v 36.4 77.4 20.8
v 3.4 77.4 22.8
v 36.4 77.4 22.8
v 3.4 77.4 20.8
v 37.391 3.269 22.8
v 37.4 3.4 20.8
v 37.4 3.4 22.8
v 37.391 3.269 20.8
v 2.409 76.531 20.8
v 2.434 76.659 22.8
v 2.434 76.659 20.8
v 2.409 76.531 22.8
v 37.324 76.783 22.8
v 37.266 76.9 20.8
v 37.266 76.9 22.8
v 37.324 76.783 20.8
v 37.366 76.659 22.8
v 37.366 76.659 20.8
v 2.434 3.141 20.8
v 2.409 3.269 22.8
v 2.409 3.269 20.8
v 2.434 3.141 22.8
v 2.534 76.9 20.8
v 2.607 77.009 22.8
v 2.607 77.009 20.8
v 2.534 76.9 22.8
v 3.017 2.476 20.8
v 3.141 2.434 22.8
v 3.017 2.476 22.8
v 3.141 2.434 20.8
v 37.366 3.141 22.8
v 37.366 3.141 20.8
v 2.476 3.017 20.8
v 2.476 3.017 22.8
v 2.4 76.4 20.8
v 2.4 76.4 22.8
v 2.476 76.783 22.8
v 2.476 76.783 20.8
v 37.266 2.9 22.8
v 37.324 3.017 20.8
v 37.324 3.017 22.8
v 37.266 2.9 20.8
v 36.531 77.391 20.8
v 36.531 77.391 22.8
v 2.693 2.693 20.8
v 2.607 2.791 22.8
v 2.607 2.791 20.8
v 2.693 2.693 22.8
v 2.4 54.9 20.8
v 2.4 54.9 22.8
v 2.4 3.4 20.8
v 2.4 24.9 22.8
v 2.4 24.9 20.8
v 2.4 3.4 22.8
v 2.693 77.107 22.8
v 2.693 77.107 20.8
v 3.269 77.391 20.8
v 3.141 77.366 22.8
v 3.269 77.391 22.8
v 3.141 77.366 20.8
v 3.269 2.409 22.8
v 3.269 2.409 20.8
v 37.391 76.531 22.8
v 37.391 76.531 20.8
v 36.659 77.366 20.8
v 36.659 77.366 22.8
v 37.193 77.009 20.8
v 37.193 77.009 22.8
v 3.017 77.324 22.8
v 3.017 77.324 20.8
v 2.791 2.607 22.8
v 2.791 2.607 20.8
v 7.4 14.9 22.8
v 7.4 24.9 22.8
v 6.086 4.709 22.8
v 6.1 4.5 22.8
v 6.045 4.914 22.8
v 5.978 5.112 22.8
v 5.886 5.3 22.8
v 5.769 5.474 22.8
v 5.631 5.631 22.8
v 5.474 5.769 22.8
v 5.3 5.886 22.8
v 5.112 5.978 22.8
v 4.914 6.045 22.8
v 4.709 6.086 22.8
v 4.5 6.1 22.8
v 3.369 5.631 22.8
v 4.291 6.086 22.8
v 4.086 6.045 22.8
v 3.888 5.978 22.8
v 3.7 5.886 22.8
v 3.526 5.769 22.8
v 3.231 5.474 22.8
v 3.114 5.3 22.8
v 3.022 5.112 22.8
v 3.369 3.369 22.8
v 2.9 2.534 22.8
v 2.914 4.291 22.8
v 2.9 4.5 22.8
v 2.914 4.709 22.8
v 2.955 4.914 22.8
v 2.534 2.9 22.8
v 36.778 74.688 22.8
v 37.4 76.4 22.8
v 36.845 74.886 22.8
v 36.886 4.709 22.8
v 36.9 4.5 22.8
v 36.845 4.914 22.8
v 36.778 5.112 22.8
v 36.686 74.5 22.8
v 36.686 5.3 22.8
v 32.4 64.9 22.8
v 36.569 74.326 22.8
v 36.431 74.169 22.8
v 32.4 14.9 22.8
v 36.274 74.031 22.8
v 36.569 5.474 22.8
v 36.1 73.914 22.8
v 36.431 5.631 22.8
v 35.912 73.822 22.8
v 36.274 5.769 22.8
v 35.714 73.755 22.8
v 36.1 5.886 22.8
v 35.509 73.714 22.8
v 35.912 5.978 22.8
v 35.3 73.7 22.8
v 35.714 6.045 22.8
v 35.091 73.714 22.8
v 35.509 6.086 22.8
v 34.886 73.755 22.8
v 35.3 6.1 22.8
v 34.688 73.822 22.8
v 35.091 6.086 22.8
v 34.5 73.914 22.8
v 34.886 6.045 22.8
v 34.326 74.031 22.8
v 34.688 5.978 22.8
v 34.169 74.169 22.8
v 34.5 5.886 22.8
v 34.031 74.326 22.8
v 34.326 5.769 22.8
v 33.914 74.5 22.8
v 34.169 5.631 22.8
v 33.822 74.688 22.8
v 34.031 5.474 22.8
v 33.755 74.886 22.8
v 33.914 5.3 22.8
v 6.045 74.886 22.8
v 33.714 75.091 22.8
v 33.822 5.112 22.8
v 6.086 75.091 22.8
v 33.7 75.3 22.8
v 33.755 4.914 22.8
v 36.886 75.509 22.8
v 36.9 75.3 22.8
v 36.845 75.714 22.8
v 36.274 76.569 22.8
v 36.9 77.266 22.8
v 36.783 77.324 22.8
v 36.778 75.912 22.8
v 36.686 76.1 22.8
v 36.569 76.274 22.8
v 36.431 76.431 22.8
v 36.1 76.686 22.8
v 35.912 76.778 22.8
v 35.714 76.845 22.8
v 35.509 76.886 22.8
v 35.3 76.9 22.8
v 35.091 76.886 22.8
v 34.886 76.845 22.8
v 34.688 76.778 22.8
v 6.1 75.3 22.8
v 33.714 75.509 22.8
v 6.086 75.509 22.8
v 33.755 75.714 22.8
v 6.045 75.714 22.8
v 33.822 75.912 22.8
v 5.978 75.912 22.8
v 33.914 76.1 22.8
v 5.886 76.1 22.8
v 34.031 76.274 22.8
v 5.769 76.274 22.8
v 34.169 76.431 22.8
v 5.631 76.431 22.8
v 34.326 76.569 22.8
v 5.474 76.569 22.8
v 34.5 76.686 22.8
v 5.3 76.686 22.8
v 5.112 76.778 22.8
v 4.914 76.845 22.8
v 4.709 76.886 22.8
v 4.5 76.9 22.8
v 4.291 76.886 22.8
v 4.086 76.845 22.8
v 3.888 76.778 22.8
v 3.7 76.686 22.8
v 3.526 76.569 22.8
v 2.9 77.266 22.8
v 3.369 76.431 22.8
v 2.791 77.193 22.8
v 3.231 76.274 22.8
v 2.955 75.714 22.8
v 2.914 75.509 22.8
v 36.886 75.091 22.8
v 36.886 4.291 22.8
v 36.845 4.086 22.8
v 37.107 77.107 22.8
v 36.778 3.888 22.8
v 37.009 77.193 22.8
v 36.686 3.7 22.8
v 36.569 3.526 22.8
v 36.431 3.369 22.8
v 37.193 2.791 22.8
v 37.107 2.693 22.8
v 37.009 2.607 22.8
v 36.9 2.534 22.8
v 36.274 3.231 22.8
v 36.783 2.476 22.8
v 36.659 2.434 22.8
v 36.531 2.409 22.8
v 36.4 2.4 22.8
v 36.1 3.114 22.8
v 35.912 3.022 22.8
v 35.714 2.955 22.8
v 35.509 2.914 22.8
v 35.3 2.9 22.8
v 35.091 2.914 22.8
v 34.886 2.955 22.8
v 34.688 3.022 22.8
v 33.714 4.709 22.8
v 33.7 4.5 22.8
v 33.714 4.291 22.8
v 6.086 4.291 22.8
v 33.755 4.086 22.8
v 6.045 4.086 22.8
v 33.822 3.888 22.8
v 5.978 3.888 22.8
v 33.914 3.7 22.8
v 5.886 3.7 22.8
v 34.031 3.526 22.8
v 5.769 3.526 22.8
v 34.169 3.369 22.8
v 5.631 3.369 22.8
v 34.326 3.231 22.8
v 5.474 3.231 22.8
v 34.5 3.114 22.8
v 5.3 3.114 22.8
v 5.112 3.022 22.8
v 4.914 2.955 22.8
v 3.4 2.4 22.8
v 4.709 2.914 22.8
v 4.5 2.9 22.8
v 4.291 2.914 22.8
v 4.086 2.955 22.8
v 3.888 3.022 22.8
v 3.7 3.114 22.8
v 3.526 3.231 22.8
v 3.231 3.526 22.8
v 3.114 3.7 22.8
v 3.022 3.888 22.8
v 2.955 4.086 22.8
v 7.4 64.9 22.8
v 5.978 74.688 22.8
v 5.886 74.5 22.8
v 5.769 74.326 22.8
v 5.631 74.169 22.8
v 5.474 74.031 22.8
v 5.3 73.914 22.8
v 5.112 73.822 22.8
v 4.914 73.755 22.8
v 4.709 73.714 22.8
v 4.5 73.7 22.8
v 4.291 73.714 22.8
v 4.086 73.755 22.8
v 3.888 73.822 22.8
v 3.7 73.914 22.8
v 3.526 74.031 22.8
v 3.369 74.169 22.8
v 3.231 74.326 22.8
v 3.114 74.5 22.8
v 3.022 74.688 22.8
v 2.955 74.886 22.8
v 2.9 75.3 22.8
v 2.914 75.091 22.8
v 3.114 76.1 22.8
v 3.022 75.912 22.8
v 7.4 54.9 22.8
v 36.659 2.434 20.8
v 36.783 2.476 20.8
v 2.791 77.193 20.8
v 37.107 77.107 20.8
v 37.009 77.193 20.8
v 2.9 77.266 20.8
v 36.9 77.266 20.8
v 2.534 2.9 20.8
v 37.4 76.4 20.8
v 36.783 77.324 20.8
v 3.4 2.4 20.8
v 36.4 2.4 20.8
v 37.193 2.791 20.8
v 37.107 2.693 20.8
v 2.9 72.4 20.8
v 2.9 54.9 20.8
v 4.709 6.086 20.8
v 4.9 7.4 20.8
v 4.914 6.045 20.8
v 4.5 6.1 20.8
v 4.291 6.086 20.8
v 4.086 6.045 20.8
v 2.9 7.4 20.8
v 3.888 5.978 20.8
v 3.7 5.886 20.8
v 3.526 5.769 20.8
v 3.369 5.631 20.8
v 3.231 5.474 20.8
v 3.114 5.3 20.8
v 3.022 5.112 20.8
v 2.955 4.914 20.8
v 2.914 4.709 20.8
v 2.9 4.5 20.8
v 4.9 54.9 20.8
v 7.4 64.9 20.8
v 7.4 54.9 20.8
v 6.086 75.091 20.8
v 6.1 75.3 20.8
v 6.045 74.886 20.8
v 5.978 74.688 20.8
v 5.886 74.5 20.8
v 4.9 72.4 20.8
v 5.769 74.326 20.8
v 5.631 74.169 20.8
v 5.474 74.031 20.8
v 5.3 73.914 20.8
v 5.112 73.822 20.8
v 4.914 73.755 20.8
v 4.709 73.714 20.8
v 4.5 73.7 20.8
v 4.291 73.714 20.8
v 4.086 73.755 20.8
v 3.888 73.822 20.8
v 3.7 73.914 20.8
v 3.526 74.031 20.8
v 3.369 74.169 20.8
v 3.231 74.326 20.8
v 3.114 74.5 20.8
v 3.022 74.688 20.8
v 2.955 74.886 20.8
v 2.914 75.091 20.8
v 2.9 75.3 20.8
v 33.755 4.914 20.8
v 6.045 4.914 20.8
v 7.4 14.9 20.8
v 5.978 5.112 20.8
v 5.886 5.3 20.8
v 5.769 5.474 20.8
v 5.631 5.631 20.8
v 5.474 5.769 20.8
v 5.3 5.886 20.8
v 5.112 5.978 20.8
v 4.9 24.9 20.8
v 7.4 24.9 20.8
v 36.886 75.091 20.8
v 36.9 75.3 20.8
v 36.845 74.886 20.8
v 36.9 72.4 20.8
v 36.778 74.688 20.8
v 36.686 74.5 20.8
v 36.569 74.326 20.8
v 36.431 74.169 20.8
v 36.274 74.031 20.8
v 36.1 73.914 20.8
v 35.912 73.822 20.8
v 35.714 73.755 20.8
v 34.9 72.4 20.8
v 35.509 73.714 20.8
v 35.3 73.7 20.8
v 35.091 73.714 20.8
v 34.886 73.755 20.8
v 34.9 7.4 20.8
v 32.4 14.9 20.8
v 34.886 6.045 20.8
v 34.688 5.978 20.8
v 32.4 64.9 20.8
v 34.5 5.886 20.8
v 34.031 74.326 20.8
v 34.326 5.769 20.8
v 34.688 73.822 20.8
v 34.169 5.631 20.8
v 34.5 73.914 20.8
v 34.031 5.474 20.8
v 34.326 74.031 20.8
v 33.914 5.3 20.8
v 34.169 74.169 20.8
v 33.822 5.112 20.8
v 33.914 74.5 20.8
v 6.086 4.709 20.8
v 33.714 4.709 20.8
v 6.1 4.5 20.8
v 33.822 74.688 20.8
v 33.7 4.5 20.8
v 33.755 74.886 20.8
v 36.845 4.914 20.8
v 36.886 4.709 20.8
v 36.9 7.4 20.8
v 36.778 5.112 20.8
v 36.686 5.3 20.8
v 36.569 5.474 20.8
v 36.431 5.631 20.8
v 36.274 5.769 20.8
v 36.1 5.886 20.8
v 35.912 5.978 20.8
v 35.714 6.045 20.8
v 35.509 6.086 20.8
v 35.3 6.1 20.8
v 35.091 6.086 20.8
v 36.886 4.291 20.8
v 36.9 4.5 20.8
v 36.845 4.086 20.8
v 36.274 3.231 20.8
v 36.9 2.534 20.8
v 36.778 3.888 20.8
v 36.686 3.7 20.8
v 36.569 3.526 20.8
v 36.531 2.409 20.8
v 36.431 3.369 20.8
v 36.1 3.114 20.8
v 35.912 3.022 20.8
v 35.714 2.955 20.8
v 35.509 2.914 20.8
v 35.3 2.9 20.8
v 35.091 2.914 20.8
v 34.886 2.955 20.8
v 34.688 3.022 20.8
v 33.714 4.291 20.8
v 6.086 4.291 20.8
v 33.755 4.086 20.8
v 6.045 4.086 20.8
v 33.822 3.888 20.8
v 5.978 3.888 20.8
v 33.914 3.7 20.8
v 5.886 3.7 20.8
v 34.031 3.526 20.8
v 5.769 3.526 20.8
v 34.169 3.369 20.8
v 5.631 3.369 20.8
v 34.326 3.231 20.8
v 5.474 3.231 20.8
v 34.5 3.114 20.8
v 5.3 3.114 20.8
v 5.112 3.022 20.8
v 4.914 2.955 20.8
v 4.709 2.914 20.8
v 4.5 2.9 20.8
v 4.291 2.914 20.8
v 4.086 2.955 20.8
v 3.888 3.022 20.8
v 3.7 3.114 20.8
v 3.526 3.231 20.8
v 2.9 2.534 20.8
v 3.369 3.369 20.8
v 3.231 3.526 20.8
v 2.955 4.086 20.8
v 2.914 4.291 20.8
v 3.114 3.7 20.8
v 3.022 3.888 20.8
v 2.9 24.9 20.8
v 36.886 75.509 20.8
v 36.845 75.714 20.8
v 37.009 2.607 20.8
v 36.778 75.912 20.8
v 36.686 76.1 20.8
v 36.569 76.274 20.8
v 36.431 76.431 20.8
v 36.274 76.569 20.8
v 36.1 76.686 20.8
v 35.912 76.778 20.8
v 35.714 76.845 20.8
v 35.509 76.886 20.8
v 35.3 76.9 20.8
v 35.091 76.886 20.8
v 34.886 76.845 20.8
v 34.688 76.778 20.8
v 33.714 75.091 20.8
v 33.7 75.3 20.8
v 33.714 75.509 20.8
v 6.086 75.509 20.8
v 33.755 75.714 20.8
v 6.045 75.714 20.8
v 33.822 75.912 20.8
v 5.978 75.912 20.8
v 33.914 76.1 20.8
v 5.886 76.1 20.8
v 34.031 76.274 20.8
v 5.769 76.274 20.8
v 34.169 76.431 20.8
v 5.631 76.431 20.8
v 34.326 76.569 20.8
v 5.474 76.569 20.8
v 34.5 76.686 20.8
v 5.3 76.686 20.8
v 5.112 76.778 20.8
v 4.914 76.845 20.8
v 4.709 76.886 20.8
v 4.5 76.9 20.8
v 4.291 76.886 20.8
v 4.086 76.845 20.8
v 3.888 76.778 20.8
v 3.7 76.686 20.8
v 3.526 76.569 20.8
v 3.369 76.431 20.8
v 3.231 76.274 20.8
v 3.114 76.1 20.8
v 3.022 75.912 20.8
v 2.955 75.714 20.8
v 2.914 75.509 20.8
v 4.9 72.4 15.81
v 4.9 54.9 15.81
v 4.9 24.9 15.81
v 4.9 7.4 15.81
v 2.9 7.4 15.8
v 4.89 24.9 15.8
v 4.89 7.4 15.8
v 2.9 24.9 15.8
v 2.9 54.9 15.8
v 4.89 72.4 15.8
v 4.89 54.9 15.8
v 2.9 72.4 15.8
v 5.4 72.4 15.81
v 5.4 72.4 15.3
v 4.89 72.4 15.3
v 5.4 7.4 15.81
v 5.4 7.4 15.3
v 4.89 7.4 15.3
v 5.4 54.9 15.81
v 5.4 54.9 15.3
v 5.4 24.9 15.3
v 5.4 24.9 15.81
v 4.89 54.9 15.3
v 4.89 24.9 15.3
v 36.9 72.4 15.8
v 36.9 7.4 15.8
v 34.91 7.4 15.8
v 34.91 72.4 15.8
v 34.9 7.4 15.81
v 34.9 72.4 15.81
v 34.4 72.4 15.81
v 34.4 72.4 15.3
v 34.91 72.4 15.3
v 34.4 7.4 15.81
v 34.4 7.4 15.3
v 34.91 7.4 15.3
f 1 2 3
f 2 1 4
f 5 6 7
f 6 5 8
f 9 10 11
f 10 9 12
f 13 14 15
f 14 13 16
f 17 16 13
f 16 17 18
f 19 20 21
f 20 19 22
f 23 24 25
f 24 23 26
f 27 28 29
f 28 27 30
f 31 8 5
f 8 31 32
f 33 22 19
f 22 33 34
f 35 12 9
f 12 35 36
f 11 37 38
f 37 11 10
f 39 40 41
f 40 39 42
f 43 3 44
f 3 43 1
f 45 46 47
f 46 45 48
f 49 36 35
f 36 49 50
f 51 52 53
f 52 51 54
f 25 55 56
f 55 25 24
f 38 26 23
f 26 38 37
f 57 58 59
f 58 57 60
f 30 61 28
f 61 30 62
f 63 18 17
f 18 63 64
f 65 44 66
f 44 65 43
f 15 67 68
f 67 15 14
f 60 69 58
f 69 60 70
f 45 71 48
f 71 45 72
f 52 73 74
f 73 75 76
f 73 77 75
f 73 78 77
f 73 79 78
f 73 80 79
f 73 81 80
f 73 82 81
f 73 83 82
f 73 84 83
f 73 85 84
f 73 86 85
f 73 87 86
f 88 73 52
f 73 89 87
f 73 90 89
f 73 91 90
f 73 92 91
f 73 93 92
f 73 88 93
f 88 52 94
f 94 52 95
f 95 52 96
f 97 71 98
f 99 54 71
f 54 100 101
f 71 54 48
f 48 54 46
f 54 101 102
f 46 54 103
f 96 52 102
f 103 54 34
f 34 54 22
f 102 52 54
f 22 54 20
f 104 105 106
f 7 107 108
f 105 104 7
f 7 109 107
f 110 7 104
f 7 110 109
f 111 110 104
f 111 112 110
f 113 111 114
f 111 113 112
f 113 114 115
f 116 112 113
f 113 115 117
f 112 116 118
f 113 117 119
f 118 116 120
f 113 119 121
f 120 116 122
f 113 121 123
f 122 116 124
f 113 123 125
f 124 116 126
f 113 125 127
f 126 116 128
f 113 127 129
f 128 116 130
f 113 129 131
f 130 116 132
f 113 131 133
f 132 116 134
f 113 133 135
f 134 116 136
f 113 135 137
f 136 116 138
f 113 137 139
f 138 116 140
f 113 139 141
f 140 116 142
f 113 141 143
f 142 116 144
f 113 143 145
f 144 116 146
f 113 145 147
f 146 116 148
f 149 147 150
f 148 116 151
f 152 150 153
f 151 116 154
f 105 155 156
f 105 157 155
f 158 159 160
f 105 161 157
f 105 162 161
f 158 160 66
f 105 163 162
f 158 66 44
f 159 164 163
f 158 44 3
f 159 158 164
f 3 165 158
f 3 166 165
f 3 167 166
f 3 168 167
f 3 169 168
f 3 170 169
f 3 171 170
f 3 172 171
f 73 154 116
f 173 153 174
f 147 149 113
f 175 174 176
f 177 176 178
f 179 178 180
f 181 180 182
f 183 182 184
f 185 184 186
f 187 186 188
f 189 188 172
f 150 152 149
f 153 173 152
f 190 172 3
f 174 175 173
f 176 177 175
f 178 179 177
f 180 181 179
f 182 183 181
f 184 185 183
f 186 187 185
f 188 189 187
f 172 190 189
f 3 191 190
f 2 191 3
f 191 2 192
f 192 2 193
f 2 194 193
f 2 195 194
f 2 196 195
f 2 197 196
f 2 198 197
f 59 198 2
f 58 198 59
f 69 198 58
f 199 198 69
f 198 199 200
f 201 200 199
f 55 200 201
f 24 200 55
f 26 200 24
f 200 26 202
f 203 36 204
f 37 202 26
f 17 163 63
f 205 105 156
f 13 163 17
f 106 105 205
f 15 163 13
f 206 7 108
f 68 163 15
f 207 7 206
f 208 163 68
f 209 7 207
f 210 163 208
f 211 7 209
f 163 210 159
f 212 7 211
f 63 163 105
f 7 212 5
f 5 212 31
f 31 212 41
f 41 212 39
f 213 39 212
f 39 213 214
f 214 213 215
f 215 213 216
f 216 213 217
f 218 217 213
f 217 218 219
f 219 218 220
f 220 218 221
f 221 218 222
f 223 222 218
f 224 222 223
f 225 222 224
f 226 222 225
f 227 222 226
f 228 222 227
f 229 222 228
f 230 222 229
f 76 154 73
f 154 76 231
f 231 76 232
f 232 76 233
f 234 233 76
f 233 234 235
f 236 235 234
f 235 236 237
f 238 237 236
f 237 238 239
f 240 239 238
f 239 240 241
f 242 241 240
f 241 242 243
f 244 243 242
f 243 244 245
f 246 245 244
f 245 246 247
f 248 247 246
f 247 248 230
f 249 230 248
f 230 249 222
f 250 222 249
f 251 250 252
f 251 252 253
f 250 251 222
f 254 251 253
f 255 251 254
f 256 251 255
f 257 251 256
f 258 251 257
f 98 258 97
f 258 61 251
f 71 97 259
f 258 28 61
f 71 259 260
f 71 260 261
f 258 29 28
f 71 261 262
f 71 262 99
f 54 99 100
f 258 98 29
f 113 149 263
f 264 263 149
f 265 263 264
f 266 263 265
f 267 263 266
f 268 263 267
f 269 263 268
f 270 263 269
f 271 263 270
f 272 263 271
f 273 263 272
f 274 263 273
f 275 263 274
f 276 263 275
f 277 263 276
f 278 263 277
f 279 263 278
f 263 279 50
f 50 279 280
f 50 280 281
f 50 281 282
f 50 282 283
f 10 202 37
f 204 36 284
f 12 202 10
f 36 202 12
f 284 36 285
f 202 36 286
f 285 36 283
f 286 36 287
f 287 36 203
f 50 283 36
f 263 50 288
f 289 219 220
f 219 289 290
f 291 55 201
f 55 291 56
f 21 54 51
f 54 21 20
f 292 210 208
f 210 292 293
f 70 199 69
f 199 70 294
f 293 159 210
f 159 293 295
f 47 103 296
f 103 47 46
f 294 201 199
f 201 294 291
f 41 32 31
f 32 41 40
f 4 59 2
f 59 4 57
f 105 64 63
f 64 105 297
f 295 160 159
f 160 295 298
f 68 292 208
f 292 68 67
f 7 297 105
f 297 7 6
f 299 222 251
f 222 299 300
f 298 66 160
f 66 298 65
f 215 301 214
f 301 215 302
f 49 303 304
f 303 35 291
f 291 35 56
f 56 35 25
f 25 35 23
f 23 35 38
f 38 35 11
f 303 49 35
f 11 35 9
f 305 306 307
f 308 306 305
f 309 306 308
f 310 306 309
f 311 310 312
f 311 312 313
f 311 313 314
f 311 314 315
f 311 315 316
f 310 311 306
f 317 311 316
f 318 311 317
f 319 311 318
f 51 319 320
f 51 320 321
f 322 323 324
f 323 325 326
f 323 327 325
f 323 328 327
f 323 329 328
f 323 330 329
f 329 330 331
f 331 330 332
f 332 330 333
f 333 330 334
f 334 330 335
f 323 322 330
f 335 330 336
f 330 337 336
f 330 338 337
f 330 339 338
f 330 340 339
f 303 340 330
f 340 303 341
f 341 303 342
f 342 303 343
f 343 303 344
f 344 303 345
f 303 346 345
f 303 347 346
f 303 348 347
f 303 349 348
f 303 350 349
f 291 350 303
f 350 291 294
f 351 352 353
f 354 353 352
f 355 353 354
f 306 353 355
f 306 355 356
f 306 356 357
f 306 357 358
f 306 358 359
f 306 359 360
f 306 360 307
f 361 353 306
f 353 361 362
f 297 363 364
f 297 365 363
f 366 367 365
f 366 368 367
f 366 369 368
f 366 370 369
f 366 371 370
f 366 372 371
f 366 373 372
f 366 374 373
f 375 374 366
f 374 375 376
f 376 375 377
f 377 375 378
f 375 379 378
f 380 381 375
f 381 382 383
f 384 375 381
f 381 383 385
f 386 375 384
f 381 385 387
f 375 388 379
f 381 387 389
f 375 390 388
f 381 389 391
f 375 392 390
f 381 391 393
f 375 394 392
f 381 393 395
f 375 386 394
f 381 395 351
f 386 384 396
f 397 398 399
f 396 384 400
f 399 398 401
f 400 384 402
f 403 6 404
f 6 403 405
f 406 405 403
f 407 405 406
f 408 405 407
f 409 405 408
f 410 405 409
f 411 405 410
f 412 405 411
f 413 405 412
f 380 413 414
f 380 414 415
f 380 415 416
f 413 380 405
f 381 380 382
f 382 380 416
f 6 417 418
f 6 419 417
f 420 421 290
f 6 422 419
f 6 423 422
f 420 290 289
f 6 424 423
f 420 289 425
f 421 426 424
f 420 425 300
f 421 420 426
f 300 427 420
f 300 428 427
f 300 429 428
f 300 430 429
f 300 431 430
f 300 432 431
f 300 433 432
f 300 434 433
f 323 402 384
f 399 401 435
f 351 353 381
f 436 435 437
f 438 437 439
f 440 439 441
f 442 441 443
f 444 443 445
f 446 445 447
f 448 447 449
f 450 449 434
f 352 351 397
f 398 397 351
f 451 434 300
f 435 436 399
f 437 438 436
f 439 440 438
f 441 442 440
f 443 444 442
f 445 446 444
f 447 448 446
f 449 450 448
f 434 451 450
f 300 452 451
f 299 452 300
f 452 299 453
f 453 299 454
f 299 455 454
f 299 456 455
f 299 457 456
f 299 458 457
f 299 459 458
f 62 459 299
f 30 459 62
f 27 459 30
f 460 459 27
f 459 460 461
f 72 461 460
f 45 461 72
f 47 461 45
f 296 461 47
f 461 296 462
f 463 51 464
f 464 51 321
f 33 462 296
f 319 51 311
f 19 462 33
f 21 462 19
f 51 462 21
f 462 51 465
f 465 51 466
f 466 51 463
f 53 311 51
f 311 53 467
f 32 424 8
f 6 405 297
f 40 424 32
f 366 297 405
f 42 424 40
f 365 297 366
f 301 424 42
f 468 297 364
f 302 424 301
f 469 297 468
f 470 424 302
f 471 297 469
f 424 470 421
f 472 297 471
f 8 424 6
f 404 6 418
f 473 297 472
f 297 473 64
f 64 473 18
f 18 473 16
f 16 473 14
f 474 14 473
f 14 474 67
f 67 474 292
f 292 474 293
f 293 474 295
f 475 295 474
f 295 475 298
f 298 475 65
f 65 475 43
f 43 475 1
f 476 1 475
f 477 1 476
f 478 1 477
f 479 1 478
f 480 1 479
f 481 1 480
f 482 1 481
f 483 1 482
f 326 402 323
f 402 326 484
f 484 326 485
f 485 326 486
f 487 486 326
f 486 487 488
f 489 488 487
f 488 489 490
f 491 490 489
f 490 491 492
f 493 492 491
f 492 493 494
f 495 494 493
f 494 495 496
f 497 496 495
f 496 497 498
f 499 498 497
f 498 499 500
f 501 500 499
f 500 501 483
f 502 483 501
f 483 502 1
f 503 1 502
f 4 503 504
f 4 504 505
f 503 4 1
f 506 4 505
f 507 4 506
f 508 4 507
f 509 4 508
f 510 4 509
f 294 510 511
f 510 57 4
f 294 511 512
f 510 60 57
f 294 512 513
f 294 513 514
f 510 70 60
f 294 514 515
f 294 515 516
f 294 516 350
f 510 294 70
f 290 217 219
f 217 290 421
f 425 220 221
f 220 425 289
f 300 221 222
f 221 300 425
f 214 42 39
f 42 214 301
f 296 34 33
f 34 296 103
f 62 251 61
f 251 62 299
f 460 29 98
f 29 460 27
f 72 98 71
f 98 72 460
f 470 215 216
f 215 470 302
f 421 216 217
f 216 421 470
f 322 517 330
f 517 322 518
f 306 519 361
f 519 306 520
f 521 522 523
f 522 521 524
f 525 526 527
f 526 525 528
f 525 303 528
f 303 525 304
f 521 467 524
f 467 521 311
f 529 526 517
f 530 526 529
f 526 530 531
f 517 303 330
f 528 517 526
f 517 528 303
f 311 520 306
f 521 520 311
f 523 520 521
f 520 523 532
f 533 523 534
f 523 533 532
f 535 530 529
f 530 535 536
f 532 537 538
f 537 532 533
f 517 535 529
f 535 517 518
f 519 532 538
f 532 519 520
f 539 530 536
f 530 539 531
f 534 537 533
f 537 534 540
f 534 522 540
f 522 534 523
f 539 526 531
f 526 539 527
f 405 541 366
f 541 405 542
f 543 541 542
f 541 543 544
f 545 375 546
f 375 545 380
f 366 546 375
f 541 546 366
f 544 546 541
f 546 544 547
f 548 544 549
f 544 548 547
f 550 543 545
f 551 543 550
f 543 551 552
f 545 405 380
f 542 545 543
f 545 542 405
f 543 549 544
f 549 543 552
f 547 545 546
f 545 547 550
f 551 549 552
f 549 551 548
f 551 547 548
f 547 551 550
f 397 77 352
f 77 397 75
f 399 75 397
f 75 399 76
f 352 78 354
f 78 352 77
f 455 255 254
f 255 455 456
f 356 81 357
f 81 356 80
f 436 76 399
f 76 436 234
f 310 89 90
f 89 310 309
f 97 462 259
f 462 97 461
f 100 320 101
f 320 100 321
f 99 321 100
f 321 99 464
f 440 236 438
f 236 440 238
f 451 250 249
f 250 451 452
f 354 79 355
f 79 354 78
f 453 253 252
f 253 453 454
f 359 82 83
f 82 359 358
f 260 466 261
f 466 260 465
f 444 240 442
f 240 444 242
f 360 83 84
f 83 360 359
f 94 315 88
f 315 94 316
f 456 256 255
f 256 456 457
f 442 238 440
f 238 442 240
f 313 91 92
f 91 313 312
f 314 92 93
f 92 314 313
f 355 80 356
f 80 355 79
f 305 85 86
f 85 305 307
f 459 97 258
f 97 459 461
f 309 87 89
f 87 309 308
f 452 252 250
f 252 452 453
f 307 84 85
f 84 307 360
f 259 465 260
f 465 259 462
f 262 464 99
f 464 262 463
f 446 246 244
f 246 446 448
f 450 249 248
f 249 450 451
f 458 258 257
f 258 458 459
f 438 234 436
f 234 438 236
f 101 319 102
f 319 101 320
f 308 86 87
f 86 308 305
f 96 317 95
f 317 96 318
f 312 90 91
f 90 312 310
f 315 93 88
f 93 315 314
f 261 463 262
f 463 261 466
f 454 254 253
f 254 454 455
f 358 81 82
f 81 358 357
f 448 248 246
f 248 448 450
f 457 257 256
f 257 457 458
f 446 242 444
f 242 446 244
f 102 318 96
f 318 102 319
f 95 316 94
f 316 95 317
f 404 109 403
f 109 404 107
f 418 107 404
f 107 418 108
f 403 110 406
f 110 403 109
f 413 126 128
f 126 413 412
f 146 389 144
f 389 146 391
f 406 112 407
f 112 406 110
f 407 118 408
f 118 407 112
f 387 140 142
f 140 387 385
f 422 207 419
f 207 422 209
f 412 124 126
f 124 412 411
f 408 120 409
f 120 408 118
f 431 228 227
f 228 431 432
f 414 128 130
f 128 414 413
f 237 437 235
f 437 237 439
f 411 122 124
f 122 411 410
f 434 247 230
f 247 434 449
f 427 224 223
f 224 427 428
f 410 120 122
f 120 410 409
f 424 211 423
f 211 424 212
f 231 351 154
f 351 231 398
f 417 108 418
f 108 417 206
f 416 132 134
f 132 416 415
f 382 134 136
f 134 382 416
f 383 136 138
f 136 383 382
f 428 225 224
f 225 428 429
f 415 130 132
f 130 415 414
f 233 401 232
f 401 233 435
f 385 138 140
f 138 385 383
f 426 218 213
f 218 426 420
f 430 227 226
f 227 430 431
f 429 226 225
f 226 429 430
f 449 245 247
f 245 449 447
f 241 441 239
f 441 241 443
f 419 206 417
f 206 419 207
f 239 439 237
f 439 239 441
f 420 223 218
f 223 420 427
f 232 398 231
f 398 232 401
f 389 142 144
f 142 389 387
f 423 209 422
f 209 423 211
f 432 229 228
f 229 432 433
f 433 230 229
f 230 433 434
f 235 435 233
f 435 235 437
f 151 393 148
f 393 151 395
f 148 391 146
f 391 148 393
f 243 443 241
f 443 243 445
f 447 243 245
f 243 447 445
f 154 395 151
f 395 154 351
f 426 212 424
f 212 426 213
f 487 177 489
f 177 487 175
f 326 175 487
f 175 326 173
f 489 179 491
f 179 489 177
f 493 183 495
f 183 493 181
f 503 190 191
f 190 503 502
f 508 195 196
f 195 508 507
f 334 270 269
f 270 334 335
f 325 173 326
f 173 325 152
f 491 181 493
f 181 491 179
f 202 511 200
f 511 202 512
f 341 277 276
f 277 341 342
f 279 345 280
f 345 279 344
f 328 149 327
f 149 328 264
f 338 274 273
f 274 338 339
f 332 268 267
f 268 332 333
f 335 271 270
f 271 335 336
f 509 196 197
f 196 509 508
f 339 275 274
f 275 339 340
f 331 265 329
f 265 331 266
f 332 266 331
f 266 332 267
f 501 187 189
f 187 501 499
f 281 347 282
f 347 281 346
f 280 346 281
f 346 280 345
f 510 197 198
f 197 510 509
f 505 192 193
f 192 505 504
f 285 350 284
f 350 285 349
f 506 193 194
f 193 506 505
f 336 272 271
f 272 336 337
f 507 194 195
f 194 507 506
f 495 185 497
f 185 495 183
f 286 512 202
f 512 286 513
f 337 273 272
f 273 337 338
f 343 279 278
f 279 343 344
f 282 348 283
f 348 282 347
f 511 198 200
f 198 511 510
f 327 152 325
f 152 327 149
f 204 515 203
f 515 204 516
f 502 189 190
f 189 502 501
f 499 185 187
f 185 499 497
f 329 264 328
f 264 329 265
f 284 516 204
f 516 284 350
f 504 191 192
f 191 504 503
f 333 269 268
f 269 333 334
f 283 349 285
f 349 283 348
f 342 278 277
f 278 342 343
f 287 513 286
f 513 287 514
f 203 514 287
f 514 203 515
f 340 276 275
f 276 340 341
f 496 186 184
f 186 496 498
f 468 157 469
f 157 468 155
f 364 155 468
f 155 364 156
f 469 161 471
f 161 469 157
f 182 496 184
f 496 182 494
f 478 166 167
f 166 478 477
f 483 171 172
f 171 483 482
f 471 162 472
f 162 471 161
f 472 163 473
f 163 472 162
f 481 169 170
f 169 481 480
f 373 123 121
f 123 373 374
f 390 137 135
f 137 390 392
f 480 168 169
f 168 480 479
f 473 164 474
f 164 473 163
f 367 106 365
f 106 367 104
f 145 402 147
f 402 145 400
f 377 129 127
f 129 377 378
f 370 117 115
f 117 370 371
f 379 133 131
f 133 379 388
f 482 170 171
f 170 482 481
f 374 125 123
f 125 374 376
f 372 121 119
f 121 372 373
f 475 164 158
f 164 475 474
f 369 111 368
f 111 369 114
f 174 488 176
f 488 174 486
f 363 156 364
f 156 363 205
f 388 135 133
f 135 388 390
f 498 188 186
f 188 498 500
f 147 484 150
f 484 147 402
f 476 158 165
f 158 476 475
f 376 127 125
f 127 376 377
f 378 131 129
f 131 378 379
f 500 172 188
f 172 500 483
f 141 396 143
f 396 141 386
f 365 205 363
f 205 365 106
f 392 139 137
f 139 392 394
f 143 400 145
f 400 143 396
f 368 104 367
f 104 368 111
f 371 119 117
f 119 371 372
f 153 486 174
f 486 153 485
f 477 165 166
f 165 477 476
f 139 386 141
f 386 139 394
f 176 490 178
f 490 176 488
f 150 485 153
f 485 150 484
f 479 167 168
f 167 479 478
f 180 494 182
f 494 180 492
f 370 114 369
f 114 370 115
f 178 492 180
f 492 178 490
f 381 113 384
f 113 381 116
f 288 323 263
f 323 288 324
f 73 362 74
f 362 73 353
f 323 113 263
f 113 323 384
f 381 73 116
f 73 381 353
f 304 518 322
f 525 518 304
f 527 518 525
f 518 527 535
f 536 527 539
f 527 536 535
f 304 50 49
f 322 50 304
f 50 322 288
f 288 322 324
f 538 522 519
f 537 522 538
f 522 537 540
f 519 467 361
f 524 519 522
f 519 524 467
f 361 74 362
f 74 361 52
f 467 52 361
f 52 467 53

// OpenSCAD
// Dilder Top-Mid Plate (windowed) — display cover plate with viewing window + snap-fit rails
//
// Drops into the base shell, rests on the upper shelf at z=20.8.
// Two long rails on the underside grip the display edges with a snap-fit lip.
// Has a 25×50mm viewing window centered over the display.
//
// Export:
//   openscad -o top-plate-windowed.3mf top-plate-windowed.scad

$fn = 48;

// ---- Board (Olimex ESP32-S3-DevKit-Lipo) ----
board_len      = 56;
board_wid      = 28;
antenna_proj   = 6;

// ---- Waveshare 2.13" display ----
disp_len       = 65;
disp_wid       = 30;
disp_thk       = 5;
disp_window_w  = 25;
disp_window_l  = 50;

// ---- 1000 mAh battery ----
bat_len        = 52;
bat_wid        = 35;

// ---- Enclosure geometry ----
wall_thk       = 2;
plate_thk      = 2;
pillar         = 5;
slop           = 0.4;
bat_chamber_h  = 6;
disp_clear     = 1;
board_thk      = 1.6;
wroom_h        = 3.2;

screw_clr      = 3.2;

// ---- Rounding ----
plate_corner_r = 1;

// ---- Display viewing window ----
topmid_window_w = 25;
topmid_window_l = 50;

// ---- Snap rails ----
snap_rail_w    = 2;
snap_lip_d     = 0.5;
snap_lip_h     = 0.5;

// ---- Wire pass-through ----
wire_hole_len  = 30;
wire_hole_depth = 6;

// ---- Z layout ----
z_base_top     = plate_thk;
z_mid_bot      = z_base_top + bat_chamber_h;
z_mid_top      = z_mid_bot + plate_thk;
z_board_bot    = z_mid_top;
z_board_top    = z_board_bot + board_thk;
z_wroom_top    = z_board_top + wroom_h;
z_disp_bot     = z_wroom_top + disp_clear;
z_disp_top     = z_disp_bot + disp_thk;

// ---- XY layout ----
inner_wid      = max(board_wid, disp_wid, bat_wid) + 2 * slop;
inner_len      = max(board_len + antenna_proj, disp_len + 2 * pillar, bat_len) + 2 * slop;
outer_wid      = inner_wid + 2 * wall_thk;
outer_len      = inner_len + 2 * wall_thk;

pillar_xy = [
    [wall_thk,                             wall_thk                            ],
    [outer_wid - wall_thk - pillar,        wall_thk                            ],
    [wall_thk,                             outer_len - wall_thk - pillar       ],
    [outer_wid - wall_thk - pillar,        outer_len - wall_thk - pillar       ],
];

disp_x         = (outer_wid - disp_wid) / 2;
disp_y         = (outer_len - disp_len) / 2;


// ============== SHARED ==============

module rounded_v_box(w, l, h, r, fn = 48) {
    hull() {
        for (x = [r, w - r])
            for (y = [r, l - r])
                translate([x, y, 0])
                    cylinder(r = r, h = h, $fn = fn);
    }
}


// ============== TOP-MID PLATE (WINDOWED) ==============

module top_plate_windowed() {
    plate_w = inner_wid - 2 * slop;
    plate_l = inner_len - 2 * slop;
    plate_x = wall_thk + slop;
    plate_y = wall_thk + slop;

    rail_y_local      = disp_y - plate_y;
    rail_len          = disp_len;
    rail_x_left       = disp_x - plate_x - snap_rail_w;
    rail_x_right      = disp_x - plate_x + disp_wid;
    lip_x_left        = disp_x - plate_x;
    lip_x_right       = disp_x - plate_x + disp_wid - snap_lip_d;
    snap_rail_h       = disp_thk;

    // Display viewing window (centered on plate)
    win_x = (plate_w - topmid_window_w) / 2;
    win_y = (plate_l - topmid_window_l) / 2;

    // Wire pass-through hole (-X long side, centered on Y)
    wire_y = (plate_l - wire_hole_len) / 2;

    translate([plate_x, plate_y, z_disp_top])
    difference() {
        union() {
            rounded_v_box(plate_w, plate_l, plate_thk, plate_corner_r);

            // -X long rail (body + bottom lip)
            translate([rail_x_left, rail_y_local, -snap_rail_h])
                cube([snap_rail_w, rail_len, snap_rail_h]);
            translate([lip_x_left - 0.01, rail_y_local, -snap_rail_h - snap_lip_h])
                cube([snap_lip_d + 0.01, rail_len, snap_lip_h + 0.01]);

            // +X long rail
            translate([rail_x_right, rail_y_local, -snap_rail_h])
                cube([snap_rail_w, rail_len, snap_rail_h]);
            translate([lip_x_right, rail_y_local, -snap_rail_h - snap_lip_h])
                cube([snap_lip_d + 0.01, rail_len, snap_lip_h + 0.01]);
        }

        // Screw clearance holes
        for (p = pillar_xy)
            translate([p[0] + pillar/2 - plate_x, p[1] + pillar/2 - plate_y,
                       -snap_rail_h - snap_lip_h - 1])
                cylinder(h = plate_thk + snap_rail_h + snap_lip_h + 2, d = screw_clr);

        // Display viewing window
        translate([win_x, win_y, -0.1])
            cube([topmid_window_w, topmid_window_l, plate_thk + 0.2]);

        // Wire pass-through hole
        translate([-0.1, wire_y, -snap_rail_h - snap_lip_h - 0.1])
            cube([wire_hole_depth + 0.1, wire_hole_len,
                  plate_thk + snap_rail_h + snap_lip_h + 0.2]);
    }
}

top_plate_windowed();
